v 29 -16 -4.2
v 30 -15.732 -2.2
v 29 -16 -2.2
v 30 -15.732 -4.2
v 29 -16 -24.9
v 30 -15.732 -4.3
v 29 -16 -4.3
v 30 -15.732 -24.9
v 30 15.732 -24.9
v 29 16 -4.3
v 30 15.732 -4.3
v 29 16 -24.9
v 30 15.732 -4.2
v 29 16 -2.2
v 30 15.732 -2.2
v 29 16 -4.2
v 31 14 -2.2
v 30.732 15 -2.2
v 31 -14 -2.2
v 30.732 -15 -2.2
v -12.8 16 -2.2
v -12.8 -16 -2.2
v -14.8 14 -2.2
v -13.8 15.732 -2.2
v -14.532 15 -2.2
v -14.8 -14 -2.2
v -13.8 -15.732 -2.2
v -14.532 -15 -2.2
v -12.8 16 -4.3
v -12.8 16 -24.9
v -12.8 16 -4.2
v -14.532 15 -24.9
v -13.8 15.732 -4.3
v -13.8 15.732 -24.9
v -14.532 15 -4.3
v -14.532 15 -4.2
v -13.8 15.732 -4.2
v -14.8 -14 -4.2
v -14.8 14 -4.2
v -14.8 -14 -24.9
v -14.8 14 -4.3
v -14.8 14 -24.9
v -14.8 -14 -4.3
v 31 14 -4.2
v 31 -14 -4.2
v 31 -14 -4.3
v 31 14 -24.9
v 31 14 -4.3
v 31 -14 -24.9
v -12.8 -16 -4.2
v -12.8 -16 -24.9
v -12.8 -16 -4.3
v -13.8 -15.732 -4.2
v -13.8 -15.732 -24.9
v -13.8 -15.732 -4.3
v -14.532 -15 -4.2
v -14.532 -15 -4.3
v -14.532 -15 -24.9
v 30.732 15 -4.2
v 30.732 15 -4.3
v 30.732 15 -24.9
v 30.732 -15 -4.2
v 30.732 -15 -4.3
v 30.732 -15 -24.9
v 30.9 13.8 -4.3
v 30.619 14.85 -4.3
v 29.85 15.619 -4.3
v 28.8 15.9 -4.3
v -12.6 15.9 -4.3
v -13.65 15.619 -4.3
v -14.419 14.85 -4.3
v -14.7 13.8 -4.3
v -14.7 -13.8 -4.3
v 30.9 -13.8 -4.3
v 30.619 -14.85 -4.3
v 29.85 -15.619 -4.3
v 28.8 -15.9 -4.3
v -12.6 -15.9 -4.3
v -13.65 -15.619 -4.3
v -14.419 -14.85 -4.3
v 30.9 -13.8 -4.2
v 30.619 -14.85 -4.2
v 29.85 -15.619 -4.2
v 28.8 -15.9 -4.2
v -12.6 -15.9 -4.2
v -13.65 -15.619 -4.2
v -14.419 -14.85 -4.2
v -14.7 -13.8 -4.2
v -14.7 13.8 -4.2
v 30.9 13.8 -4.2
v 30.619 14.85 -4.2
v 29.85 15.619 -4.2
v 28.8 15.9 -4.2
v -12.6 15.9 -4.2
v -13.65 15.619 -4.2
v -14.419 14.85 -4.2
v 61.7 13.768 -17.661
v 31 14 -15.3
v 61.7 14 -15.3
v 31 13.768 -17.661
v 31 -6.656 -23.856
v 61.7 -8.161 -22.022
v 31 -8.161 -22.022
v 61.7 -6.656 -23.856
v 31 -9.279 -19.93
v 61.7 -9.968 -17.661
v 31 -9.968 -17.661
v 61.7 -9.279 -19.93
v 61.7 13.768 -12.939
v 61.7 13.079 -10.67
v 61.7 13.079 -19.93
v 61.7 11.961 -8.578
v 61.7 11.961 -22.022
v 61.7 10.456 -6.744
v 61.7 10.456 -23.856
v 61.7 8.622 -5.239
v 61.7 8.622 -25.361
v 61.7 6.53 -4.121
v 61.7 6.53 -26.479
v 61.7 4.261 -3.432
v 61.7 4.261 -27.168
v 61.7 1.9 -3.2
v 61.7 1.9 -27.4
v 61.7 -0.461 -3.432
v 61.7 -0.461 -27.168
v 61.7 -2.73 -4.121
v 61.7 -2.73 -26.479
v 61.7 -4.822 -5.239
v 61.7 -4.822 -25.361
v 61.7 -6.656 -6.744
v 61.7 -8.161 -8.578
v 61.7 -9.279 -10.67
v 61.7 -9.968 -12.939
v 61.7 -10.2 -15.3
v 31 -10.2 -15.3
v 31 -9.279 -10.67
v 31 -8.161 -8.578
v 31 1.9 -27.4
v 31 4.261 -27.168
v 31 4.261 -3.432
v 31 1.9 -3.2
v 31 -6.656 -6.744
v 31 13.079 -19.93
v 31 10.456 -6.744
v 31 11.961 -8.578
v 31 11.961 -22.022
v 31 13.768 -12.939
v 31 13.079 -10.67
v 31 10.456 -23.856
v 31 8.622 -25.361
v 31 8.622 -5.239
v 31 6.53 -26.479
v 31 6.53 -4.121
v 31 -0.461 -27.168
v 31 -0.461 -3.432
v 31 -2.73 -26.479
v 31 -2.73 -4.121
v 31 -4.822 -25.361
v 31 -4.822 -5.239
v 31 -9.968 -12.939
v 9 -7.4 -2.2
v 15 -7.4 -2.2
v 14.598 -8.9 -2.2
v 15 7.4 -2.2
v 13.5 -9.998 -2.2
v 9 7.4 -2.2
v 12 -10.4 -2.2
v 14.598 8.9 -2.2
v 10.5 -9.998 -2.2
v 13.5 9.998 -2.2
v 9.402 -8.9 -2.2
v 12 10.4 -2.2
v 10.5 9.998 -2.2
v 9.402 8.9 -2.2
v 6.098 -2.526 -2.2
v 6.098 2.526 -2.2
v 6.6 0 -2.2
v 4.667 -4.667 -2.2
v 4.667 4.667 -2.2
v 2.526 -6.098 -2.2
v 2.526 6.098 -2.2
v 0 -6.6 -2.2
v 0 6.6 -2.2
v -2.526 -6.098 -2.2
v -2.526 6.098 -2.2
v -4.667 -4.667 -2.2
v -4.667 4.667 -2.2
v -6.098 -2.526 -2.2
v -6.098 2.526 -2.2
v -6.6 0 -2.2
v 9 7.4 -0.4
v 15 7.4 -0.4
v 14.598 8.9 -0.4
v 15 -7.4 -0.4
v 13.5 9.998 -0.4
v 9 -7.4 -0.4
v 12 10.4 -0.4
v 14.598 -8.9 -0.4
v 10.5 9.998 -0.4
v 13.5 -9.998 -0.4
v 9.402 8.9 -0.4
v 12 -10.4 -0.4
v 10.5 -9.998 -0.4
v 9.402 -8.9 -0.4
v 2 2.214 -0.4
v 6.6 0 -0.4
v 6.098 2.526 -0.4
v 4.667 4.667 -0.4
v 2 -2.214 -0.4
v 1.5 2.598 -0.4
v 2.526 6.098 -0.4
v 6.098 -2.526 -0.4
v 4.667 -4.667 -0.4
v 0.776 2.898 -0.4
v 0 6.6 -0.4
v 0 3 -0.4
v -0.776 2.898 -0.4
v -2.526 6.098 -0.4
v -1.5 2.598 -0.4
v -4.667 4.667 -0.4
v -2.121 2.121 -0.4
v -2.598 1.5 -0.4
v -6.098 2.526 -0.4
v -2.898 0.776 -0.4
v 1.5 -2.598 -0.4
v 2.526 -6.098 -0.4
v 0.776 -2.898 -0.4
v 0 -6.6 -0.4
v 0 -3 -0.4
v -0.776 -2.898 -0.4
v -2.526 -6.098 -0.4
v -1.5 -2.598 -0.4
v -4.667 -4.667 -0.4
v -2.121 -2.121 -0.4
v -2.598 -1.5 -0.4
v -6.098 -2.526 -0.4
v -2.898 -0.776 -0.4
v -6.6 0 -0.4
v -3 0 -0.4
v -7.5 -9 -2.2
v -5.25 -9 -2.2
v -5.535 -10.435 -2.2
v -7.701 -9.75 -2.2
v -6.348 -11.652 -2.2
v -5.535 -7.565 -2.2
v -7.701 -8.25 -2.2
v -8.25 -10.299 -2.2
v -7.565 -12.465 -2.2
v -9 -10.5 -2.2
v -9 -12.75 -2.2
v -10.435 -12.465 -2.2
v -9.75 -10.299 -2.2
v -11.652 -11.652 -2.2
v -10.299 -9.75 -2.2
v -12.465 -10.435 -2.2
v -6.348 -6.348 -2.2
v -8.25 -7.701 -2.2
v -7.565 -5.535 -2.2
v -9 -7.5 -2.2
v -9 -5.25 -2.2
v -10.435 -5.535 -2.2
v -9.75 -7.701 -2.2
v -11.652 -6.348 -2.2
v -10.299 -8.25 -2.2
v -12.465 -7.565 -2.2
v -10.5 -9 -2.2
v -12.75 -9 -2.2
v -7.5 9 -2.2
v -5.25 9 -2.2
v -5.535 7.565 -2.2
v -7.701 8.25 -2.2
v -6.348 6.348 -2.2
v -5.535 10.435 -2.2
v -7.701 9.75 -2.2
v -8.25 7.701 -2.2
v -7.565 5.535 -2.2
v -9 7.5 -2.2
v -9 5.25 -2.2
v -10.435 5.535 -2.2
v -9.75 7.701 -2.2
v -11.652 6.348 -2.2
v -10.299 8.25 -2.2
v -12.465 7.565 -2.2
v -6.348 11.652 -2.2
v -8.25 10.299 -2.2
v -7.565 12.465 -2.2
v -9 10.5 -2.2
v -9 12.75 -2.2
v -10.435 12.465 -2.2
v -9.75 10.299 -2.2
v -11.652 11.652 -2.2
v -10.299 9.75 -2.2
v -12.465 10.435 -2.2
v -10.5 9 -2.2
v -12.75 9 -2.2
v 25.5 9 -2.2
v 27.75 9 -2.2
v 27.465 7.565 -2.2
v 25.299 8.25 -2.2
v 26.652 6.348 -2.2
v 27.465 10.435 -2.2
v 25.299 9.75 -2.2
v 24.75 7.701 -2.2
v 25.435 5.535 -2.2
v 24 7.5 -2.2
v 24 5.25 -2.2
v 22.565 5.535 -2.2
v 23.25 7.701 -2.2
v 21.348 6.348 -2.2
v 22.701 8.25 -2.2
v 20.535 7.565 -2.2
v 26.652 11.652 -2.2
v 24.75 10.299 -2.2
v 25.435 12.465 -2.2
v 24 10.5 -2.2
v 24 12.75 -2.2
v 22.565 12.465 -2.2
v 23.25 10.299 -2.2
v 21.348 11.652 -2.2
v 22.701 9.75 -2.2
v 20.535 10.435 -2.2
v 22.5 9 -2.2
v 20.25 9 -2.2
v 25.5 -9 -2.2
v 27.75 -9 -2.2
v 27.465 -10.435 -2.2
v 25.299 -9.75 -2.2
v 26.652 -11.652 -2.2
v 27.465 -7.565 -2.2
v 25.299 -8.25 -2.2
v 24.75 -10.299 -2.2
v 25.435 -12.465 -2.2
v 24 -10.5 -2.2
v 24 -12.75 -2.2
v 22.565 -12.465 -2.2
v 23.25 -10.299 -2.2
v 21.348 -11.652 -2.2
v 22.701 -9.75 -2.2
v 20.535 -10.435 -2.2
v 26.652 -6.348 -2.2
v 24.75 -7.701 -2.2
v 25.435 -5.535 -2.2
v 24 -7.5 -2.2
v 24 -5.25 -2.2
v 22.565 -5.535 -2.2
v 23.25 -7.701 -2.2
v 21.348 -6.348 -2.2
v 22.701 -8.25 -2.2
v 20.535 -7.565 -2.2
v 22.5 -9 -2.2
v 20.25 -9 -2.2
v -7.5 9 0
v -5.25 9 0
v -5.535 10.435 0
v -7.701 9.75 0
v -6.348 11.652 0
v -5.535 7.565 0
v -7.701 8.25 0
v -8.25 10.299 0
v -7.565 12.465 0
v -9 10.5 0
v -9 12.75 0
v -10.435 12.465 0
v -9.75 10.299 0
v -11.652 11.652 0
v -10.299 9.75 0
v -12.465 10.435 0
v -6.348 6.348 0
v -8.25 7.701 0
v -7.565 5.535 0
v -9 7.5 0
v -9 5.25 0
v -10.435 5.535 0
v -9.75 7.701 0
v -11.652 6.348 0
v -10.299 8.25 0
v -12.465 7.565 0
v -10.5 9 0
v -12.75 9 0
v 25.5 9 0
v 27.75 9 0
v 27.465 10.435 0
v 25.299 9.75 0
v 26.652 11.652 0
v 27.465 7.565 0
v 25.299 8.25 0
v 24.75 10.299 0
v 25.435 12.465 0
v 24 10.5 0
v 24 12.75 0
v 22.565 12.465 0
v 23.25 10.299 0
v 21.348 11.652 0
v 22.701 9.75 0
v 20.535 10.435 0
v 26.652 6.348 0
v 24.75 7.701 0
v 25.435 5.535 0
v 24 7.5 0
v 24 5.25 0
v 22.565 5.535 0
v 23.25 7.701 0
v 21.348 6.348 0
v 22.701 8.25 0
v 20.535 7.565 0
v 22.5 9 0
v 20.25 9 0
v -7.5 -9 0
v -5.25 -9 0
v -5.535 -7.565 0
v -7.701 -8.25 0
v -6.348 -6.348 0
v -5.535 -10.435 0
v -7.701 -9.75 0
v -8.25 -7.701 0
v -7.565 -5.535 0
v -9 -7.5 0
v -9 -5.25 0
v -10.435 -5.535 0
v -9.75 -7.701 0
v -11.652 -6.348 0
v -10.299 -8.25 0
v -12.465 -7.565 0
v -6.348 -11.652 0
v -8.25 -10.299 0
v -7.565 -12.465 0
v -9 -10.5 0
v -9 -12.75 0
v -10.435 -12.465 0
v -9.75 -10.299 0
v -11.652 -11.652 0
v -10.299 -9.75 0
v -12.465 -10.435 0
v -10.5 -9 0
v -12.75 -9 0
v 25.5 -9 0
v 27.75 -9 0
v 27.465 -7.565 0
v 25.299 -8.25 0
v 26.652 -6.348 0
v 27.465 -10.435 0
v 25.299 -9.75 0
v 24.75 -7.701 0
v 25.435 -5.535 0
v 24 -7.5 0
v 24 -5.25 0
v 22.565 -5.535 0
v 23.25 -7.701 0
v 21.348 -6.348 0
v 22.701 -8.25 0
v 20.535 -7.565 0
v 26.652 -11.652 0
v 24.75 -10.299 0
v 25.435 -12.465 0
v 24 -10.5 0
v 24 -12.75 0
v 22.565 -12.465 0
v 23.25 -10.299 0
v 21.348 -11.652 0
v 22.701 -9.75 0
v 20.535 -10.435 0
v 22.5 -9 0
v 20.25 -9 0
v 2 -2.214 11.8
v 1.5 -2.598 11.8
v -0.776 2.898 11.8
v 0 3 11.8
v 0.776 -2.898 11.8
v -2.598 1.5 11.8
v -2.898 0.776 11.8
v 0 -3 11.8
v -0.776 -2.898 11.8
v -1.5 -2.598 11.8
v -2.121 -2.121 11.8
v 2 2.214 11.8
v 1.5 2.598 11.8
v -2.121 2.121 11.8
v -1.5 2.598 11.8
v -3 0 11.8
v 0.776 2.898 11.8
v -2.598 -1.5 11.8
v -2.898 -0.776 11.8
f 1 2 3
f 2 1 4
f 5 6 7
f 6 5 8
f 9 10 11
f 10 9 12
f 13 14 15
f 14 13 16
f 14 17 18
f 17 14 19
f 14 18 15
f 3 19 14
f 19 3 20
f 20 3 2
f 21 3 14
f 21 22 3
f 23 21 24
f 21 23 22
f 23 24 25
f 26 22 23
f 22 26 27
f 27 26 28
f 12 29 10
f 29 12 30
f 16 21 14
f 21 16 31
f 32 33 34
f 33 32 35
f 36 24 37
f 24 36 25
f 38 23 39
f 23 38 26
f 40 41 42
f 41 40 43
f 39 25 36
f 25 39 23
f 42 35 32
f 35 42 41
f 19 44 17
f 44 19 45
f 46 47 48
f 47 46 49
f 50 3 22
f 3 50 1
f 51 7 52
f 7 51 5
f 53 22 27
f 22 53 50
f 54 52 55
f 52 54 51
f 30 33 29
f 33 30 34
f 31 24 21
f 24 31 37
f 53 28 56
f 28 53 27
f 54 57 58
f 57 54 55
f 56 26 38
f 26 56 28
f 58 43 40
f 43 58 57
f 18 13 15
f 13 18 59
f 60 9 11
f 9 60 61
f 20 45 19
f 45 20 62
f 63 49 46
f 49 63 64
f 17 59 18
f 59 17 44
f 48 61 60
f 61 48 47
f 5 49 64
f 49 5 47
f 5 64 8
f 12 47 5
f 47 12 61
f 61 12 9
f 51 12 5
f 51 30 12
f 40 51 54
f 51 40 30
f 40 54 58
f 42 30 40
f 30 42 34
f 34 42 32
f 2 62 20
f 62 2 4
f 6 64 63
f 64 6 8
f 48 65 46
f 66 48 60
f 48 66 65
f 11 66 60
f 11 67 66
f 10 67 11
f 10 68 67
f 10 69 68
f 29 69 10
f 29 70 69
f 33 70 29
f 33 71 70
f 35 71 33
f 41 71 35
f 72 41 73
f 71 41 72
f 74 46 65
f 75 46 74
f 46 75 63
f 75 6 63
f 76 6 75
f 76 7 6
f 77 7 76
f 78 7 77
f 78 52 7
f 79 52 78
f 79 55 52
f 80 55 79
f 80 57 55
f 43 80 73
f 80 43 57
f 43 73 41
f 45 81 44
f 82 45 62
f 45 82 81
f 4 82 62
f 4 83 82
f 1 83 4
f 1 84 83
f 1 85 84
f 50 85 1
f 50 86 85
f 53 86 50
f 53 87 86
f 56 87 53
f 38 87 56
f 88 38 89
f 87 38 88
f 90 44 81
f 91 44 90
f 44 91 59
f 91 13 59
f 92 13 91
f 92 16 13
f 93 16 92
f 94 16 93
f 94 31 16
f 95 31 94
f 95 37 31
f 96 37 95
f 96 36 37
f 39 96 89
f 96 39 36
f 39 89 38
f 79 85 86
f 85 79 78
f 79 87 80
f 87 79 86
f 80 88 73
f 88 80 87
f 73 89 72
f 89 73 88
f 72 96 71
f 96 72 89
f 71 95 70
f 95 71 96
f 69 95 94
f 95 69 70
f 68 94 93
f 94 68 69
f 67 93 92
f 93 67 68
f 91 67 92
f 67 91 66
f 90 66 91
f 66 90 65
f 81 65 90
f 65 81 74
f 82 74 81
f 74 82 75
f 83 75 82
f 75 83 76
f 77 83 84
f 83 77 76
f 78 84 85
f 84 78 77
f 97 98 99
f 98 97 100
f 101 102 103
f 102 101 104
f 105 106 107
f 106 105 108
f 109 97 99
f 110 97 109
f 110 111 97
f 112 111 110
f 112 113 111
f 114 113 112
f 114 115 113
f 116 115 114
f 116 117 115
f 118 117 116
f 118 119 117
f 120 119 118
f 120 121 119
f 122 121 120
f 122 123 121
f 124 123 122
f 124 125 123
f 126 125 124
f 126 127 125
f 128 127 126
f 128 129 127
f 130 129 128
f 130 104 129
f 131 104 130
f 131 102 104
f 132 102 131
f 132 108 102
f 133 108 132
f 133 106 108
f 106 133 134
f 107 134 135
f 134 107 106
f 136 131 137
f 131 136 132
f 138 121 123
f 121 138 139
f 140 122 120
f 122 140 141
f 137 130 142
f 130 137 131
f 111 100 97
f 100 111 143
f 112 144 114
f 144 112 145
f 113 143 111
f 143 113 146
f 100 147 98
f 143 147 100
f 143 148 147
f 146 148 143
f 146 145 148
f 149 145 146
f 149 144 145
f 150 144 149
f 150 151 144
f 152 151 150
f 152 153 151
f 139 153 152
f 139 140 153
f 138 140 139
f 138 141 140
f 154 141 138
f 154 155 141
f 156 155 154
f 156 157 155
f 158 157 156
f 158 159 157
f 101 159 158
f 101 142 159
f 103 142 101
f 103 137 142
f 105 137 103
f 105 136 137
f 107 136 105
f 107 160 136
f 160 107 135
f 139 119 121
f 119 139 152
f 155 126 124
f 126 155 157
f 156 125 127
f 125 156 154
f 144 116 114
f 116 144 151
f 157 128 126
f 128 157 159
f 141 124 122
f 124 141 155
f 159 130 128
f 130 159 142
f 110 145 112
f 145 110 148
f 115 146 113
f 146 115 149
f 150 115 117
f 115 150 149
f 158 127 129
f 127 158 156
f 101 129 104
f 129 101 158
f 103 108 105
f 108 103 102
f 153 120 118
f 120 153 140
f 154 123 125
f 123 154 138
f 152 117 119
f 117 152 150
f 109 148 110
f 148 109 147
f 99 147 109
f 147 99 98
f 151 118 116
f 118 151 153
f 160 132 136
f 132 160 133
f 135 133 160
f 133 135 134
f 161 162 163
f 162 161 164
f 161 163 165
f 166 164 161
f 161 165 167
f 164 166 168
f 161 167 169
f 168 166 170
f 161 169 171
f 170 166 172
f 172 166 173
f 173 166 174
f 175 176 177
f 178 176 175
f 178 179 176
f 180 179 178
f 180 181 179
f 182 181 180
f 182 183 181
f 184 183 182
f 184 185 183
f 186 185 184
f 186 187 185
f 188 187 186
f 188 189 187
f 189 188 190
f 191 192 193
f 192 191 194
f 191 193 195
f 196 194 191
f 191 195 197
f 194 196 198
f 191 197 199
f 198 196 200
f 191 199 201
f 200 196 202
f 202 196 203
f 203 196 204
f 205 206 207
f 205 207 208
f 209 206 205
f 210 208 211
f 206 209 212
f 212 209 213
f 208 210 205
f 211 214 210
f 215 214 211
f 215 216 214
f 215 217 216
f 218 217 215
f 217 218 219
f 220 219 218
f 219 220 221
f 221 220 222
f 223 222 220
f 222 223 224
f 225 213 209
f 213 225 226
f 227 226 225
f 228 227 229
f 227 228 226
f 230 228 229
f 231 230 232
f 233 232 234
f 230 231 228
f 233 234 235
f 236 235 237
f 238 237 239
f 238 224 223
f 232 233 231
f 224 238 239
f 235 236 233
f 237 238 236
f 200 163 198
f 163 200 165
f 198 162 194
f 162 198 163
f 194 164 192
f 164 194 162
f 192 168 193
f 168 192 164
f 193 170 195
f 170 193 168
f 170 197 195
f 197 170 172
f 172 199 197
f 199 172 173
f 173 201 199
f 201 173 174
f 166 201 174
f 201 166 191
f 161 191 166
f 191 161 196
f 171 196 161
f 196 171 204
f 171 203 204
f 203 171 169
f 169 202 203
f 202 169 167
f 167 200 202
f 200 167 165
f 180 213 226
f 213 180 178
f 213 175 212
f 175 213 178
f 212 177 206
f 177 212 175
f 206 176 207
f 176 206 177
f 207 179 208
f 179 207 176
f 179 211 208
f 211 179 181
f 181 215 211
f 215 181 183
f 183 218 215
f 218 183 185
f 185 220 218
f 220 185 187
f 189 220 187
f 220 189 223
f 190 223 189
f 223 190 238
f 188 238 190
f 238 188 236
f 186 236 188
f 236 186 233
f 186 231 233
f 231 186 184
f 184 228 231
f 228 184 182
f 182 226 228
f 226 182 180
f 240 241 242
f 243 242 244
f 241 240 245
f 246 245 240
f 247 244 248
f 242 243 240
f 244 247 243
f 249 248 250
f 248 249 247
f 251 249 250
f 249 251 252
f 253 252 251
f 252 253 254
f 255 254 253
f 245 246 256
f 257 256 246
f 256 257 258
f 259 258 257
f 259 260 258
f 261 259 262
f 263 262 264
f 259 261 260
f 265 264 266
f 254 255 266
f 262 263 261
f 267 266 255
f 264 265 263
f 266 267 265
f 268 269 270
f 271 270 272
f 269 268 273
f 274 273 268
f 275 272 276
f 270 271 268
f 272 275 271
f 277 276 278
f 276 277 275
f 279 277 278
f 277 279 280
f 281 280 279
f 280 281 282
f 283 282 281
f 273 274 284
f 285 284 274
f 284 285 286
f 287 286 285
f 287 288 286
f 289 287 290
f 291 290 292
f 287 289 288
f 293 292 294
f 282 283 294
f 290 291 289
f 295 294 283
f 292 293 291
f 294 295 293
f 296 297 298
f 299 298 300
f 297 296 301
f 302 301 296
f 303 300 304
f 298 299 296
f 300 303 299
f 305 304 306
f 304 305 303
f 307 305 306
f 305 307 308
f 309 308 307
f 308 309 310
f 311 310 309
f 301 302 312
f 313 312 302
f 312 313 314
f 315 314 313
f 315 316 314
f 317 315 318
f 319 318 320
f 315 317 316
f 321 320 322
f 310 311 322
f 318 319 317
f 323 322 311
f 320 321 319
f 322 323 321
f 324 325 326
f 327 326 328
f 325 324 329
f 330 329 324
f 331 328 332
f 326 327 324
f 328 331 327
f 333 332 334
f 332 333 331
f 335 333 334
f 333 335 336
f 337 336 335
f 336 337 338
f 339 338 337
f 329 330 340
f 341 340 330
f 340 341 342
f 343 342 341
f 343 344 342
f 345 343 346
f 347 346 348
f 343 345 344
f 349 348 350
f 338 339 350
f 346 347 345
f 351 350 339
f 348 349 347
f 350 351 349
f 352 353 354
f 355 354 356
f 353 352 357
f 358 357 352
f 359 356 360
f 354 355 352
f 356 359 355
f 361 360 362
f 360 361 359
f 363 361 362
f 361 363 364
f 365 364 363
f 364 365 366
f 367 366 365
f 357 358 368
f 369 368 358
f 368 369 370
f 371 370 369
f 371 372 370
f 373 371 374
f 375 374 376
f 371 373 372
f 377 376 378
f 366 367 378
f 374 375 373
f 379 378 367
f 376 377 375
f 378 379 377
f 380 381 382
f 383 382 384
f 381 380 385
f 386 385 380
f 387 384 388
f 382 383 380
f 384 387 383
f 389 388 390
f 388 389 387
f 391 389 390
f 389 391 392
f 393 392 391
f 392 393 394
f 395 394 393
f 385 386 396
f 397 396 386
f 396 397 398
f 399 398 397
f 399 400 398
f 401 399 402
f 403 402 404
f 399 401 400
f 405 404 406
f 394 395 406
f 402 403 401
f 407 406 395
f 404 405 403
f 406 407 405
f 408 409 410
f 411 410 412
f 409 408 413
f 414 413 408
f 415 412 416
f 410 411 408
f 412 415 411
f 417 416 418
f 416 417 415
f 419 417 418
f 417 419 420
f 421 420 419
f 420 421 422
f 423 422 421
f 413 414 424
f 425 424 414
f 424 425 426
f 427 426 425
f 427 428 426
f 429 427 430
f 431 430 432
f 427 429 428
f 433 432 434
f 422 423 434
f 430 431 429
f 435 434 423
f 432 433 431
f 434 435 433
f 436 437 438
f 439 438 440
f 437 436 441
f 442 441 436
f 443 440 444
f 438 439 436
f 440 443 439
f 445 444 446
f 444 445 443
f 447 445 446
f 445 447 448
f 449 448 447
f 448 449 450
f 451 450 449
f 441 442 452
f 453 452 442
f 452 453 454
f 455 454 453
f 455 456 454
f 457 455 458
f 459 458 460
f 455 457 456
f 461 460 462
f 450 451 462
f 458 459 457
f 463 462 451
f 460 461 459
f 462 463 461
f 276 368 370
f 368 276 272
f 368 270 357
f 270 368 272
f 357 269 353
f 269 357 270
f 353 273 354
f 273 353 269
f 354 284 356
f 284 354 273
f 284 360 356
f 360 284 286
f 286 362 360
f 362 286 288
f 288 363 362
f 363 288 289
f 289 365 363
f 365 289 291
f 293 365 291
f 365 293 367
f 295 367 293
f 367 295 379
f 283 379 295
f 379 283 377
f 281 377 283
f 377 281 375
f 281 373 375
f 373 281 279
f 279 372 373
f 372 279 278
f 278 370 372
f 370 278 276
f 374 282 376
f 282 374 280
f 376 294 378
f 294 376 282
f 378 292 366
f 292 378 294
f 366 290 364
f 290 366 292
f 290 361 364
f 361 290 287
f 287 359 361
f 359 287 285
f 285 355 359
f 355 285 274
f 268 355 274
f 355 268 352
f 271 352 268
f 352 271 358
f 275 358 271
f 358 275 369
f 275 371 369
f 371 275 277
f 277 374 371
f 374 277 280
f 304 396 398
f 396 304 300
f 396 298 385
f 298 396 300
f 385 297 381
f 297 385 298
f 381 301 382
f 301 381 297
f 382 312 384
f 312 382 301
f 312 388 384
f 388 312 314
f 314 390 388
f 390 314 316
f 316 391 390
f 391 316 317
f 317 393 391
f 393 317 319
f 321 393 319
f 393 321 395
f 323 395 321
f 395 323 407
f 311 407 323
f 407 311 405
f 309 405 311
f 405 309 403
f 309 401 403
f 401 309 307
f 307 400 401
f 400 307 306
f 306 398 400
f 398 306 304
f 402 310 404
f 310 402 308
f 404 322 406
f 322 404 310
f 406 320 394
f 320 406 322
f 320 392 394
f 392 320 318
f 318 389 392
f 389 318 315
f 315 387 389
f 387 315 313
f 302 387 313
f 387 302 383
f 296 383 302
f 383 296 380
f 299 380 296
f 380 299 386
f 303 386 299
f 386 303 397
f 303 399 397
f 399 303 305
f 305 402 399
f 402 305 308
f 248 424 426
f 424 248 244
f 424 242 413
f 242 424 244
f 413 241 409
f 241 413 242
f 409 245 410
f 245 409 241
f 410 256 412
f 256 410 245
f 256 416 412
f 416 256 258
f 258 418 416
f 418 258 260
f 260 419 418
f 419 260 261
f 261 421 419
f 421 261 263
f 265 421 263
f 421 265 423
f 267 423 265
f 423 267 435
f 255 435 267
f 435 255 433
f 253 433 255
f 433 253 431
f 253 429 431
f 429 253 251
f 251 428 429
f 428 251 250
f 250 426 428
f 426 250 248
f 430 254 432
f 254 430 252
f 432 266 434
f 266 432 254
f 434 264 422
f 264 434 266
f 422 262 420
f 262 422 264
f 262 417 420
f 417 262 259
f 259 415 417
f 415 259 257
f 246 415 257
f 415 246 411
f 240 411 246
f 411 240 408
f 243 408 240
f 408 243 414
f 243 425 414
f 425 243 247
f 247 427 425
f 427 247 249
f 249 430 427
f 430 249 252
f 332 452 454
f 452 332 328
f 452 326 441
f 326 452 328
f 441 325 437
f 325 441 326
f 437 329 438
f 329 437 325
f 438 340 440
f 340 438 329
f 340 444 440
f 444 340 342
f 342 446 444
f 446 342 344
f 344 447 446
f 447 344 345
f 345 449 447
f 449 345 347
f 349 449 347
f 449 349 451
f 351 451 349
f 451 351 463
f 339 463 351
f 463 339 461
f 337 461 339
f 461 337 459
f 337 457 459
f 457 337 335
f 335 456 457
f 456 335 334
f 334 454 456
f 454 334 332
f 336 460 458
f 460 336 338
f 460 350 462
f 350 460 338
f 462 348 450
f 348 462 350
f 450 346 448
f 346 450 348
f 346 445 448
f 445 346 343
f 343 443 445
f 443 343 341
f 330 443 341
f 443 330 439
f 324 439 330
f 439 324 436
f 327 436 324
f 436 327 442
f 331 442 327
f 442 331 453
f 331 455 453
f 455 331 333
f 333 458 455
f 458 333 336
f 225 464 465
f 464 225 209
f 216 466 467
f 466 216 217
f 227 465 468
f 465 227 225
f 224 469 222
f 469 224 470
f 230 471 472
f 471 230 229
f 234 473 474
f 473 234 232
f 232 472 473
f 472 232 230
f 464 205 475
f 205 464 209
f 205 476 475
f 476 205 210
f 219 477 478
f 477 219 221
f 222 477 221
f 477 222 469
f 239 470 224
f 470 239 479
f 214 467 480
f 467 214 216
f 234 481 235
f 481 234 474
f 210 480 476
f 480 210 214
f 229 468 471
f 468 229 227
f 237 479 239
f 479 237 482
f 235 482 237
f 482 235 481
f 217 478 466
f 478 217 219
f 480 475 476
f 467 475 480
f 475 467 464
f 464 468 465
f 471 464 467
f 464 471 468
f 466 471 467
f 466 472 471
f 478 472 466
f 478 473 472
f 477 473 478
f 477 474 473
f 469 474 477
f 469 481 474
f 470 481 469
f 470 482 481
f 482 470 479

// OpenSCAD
module jgy_motor(angle=0) {

    // Key dimensions for the Aslong JGY-370 DC gearmotors (and look alikes).
    jgy_shaft_d = 6.0;
    jgy_shaft_h = 14;
    jgy_base_d = 13.2;
    jgy_base_h = 1.8;
    jgy_mount_screw = "M3";
    jgy_mount_screw_l = 6;
    jgy_mount_screw_depth = 4;
    jgy_mount_h = 2.2;
    jgy_mount_dx1 = 18;
    jgy_mount_dx2 = 18;
    jgy_mount_dy1 = -9;
    jgy_mount_dy2 = 33 + jgy_mount_dy1;
    jgy_w = 32;
    jgy_l = 81;
    jgy_h = 27;
    jgy_motor_d = 24.2;
    jgy_motor_l = 30.7;
    jgy_motor_offset = 31.0;
    jgy_gbox_w = 32.0;
    jgy_gbox_l = 45.8;
    jgy_gbox_h = 24.5 - jgy_base_h;
    jgy_gbox_r = 2;
    jgy_gbox_offset = jgy_motor_offset - jgy_gbox_l;

    translate([0, 0, -jgy_mount_h]) {
        translate([jgy_gbox_offset, -jgy_gbox_w/2, -jgy_gbox_h]) {
            translate([jgy_gbox_l, jgy_gbox_w - jgy_motor_d/2 - 2, jgy_gbox_h - jgy_motor_d/2 - 1]) rotate([0, 90, 0])
            cylinder(h=jgy_motor_l, d=jgy_motor_d, $fn=32);

            difference() {
                linear_extrude(jgy_gbox_h, convexity=8) {
                    offset(r=jgy_gbox_r, $fn=12) offset(delta=-jgy_gbox_r)
                        square([jgy_gbox_l, jgy_gbox_w]);
                }
                translate([0, 0, jgy_gbox_h-2-0.1]) linear_extrude(0.1, convexity=8) {
                    difference() {
                        offset(r=jgy_gbox_r+0.1, $fn=12) offset(delta=-jgy_gbox_r)
                            square([jgy_gbox_l, jgy_gbox_w]);
                        offset(r=jgy_gbox_r+0.1, $fn=12) offset(delta=-jgy_gbox_r-0.2)
                            square([jgy_gbox_l, jgy_gbox_w]);
                    }
                }
            }
        }

        linear_extrude(jgy_base_h) {
            circle(d=jgy_base_d, $fn=16);
            hull() {
                translate([12, -14.8/2]) circle(d=6, $fn=12);
                translate([12,  14.8/2]) circle(d=6, $fn=12);
            }
        }

        linear_extrude(jgy_mount_h, convexity=8) {
            difference() {
                union() {
                    translate([jgy_mount_dy1, -jgy_mount_dx1/2]) circle(d=7.5, $fn=16);
                    translate([jgy_mount_dy1,  jgy_mount_dx1/2]) circle(d=7.5, $fn=16);
                    translate([jgy_mount_dy2, -jgy_mount_dx2/2]) circle(d=7.5, $fn=16);
                    translate([jgy_mount_dy2,  jgy_mount_dx2/2]) circle(d=7.5, $fn=16);
                }
                translate([jgy_mount_dy1, -jgy_mount_dx1/2]) circle(d=3, $fn=12);
                translate([jgy_mount_dy1,  jgy_mount_dx1/2]) circle(d=3, $fn=12);
                translate([jgy_mount_dy2, -jgy_mount_dx2/2]) circle(d=3, $fn=12);
                translate([jgy_mount_dy2,  jgy_mount_dx2/2]) circle(d=3, $fn=12);
            }
        }

        linear_extrude(jgy_shaft_h) {
            rotate([0, 0, angle]) {
                intersection() {
                    circle(d=jgy_shaft_d, $fn=24);
                    translate([-1, 0]) square(jgy_shaft_d, center=true);
                }
            }
        }
    }
}

jgy_motor();
